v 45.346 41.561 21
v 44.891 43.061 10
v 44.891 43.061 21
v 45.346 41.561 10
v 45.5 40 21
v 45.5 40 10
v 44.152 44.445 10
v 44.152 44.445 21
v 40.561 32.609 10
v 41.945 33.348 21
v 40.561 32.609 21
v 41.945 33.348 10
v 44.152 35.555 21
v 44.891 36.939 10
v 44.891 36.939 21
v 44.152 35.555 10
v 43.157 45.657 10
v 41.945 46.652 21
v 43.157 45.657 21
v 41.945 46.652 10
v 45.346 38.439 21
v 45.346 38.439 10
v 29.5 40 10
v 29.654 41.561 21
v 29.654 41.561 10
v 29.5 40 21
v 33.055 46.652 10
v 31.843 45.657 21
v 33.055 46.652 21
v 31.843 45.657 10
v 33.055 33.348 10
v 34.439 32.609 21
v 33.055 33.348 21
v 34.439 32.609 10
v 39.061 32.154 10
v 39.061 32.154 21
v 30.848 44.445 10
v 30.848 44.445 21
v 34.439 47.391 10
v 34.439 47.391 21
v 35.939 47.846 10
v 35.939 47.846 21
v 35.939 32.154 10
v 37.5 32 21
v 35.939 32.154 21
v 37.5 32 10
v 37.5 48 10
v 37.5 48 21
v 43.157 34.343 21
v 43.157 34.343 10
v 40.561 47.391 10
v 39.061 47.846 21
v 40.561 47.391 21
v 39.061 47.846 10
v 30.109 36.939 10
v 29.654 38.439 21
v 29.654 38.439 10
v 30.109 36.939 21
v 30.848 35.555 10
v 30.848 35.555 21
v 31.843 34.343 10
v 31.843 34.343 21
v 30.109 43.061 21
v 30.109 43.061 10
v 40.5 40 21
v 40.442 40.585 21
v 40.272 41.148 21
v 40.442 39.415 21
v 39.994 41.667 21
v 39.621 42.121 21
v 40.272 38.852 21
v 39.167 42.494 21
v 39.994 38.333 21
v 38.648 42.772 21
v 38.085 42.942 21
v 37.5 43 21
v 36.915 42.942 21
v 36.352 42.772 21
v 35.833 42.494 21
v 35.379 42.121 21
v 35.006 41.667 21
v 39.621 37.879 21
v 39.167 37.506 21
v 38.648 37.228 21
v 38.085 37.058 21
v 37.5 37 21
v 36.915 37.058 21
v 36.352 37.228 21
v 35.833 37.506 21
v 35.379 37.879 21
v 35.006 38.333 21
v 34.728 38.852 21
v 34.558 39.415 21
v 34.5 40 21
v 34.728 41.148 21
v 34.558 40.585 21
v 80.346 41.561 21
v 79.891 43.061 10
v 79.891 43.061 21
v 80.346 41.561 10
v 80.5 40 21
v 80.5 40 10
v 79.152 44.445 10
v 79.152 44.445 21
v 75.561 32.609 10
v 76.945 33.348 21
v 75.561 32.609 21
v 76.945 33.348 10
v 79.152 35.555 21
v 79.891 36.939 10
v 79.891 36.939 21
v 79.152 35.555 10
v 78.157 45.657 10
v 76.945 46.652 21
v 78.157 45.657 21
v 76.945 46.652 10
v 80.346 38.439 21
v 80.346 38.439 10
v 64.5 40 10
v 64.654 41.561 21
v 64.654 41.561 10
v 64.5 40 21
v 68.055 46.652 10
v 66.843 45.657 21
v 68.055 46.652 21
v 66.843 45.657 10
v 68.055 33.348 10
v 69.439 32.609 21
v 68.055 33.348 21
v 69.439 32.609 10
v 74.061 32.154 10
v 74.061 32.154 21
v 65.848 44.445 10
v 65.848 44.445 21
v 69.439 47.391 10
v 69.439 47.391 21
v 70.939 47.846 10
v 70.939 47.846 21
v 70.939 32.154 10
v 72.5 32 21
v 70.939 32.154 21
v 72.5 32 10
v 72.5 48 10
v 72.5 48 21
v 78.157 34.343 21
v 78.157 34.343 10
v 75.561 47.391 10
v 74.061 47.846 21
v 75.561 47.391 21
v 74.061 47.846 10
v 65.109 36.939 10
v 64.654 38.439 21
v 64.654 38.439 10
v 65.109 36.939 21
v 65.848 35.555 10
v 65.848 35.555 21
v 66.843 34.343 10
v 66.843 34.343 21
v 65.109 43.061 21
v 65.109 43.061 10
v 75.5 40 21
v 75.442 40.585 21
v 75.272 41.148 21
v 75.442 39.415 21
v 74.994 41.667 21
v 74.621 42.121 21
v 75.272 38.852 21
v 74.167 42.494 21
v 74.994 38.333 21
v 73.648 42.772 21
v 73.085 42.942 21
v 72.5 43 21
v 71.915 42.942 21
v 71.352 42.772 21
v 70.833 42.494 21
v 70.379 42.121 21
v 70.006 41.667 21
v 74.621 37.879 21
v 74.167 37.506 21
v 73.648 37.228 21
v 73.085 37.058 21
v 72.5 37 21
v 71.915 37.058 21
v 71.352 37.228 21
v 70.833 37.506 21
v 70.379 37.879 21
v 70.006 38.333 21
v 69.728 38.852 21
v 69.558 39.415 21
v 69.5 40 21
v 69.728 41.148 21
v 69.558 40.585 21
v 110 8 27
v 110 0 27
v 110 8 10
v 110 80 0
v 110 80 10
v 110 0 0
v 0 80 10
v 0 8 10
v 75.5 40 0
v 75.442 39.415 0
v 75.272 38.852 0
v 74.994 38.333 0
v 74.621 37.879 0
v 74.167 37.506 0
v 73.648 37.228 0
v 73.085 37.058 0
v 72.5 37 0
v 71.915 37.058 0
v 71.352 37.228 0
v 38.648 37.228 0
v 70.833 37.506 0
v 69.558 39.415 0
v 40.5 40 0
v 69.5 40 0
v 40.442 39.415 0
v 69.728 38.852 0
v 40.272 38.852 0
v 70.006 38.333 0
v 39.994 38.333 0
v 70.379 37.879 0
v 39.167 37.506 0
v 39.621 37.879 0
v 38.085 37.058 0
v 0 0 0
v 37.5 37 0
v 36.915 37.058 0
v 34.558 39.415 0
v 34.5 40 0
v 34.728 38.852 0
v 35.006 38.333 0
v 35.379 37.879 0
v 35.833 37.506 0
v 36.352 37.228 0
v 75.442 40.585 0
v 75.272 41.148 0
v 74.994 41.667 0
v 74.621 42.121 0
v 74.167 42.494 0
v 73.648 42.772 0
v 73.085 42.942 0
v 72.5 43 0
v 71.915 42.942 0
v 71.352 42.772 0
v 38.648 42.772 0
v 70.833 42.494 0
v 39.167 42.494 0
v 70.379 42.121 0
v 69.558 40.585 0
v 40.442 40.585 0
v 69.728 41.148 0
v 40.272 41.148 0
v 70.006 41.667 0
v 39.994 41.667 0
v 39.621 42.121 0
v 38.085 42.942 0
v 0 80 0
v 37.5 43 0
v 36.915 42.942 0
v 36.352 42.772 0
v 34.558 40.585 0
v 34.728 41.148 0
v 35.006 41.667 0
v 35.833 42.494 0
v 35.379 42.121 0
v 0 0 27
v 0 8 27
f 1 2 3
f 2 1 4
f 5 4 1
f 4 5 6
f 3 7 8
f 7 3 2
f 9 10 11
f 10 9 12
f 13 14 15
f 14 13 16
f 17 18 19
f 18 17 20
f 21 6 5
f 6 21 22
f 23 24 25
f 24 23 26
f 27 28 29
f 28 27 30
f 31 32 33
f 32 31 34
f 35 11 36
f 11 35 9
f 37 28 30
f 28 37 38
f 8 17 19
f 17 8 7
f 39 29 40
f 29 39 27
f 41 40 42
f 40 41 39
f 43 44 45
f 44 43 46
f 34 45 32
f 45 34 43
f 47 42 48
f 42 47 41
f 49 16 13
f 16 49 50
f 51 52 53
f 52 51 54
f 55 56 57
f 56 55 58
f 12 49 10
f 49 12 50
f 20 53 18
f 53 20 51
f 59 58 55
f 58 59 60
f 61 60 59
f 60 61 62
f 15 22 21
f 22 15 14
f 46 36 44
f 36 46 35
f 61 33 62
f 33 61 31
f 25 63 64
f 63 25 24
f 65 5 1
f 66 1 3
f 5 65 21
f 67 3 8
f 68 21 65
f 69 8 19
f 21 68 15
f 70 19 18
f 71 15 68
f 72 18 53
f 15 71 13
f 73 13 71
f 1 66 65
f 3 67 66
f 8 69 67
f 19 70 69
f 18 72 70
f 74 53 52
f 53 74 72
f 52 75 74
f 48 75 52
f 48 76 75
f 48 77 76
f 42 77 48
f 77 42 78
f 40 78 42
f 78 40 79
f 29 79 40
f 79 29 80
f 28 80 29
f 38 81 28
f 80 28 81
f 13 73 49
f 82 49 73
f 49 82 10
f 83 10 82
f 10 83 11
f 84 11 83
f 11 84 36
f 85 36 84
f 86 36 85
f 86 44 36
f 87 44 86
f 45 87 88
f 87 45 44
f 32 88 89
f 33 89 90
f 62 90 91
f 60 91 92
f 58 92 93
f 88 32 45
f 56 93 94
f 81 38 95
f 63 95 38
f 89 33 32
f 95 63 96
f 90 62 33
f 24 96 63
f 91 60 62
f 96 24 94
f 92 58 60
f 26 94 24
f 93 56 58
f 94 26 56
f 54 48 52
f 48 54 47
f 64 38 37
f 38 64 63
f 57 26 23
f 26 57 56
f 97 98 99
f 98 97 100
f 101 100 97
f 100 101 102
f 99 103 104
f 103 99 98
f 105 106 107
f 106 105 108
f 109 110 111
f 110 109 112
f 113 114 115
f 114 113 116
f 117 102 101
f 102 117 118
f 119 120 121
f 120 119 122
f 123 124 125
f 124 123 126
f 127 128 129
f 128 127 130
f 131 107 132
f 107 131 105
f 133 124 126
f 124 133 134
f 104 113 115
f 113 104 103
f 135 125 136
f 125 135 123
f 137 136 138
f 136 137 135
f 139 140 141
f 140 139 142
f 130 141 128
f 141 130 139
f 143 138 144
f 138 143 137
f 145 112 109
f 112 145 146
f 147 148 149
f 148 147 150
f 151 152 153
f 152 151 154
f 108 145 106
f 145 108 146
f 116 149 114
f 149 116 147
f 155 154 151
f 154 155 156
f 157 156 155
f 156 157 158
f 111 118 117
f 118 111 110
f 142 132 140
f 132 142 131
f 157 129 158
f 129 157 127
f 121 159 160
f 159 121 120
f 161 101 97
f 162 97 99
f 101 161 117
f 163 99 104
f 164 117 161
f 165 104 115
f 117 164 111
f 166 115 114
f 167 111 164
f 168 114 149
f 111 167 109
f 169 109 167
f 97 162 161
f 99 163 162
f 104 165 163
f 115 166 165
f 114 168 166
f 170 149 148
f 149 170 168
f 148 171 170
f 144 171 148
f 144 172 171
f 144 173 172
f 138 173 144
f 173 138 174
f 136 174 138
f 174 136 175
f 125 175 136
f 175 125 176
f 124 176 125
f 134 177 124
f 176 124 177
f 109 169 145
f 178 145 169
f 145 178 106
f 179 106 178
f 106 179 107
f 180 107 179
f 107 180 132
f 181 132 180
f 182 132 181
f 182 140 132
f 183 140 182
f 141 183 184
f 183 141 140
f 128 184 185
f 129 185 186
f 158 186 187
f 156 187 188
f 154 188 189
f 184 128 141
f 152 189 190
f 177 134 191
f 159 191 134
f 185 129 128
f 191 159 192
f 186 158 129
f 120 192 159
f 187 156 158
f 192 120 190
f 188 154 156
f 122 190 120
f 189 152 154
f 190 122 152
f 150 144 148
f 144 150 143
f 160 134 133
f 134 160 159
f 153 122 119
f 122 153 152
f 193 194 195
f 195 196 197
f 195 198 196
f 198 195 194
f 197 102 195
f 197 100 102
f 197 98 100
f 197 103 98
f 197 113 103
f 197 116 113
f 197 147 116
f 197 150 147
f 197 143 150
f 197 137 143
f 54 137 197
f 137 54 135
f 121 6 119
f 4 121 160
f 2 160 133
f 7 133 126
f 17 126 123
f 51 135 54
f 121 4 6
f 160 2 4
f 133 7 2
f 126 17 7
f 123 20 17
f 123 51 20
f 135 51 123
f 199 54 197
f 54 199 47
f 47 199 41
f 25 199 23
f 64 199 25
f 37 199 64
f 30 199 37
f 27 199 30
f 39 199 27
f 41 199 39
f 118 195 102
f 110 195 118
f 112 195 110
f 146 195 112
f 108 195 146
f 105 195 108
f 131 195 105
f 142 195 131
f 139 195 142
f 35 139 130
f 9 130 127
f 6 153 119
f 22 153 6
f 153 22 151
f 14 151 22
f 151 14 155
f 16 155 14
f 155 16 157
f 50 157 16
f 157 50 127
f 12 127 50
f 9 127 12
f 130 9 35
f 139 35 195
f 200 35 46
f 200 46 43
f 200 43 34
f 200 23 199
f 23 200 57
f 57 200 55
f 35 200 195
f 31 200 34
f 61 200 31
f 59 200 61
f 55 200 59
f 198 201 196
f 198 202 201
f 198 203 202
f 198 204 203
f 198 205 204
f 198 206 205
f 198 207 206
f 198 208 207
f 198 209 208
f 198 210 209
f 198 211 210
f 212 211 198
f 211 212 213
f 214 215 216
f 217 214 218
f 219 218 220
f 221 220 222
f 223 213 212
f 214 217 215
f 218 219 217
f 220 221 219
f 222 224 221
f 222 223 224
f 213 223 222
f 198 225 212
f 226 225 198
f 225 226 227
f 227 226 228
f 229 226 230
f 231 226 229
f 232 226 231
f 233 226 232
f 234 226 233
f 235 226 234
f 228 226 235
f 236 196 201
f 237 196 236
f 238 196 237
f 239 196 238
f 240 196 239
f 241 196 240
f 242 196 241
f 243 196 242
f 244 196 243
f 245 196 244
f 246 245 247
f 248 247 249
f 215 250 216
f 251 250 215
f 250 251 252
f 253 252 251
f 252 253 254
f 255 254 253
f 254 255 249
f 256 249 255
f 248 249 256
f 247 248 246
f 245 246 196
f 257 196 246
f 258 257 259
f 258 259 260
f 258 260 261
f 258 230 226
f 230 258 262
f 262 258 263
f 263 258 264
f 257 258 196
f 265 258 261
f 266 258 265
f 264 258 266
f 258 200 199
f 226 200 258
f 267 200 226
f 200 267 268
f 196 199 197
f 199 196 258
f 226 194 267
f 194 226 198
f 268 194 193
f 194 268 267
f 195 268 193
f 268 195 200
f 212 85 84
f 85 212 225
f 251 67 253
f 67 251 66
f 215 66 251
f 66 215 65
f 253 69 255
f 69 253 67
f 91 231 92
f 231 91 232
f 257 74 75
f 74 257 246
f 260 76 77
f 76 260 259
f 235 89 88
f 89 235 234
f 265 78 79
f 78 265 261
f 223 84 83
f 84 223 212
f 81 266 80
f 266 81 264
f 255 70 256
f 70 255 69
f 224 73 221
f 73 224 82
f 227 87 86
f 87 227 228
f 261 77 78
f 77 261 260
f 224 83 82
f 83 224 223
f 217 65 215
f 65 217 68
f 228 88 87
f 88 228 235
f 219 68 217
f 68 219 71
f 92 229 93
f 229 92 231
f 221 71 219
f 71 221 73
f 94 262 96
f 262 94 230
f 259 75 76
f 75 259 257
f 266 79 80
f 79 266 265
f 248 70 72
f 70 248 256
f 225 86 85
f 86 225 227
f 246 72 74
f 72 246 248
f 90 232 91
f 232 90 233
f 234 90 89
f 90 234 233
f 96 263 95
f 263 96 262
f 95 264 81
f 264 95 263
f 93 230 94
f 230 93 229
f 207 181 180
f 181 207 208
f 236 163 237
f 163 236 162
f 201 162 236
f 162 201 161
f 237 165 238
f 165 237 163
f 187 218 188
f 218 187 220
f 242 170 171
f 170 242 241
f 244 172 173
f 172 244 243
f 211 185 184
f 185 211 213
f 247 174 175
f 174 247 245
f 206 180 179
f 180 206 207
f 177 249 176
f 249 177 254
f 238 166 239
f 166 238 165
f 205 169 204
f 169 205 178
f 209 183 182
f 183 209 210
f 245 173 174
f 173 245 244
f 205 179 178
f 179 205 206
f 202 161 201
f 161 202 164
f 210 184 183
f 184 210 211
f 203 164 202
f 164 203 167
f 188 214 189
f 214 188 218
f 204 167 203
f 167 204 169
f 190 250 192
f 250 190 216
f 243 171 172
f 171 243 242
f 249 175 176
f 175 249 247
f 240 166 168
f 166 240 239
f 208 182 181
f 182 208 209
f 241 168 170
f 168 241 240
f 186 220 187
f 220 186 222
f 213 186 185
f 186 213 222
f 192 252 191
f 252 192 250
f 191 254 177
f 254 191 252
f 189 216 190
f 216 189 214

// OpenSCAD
$fn = 32;

// ----------------------------------------------------------------------
// Drill jig: fence jig
// ----------------------------------------------------------------------

// --- parameters (mm) ---
plate_l = 110;            // plate length, X
plate_w = 80;             // plate width, Y
plate_t = 10;             // plate thickness
boss_d = 16;              // guide boss diameter
boss_h = 12;              // boss height above the plate
guide_d = 6;              // guide hole diameter
boss_pitch = 35;          // boss pitch
fence_h = 18;             // fence height above the plate
fence_t = 8;              // fence thickness

n_boss = 2;  // guide bosses
boss_x0 = (plate_l - (n_boss - 1) * boss_pitch) / 2;  // first boss X
boss_top = plate_t - 1 + boss_h;  // boss crown height
fence_top = plate_t - 1 + fence_h;  // fence crown height
total_h = max([fence_top, boss_top]);  // overall height

difference() {
  union() {
  cube([plate_l, plate_w, plate_t]);
  for (i = [0 : n_boss - 1])
    translate([boss_x0 + i * boss_pitch, plate_w / 2, plate_t - 1])
      cylinder(h = boss_h, d = boss_d);
  translate([0, 0, plate_t - 1]) cube([plate_l, fence_t, fence_h]);
  }
  for (i = [0 : n_boss - 1])
    translate([boss_x0 + i * boss_pitch, plate_w / 2, -1])
      cylinder(h = plate_t + boss_h, d = guide_d);
}
